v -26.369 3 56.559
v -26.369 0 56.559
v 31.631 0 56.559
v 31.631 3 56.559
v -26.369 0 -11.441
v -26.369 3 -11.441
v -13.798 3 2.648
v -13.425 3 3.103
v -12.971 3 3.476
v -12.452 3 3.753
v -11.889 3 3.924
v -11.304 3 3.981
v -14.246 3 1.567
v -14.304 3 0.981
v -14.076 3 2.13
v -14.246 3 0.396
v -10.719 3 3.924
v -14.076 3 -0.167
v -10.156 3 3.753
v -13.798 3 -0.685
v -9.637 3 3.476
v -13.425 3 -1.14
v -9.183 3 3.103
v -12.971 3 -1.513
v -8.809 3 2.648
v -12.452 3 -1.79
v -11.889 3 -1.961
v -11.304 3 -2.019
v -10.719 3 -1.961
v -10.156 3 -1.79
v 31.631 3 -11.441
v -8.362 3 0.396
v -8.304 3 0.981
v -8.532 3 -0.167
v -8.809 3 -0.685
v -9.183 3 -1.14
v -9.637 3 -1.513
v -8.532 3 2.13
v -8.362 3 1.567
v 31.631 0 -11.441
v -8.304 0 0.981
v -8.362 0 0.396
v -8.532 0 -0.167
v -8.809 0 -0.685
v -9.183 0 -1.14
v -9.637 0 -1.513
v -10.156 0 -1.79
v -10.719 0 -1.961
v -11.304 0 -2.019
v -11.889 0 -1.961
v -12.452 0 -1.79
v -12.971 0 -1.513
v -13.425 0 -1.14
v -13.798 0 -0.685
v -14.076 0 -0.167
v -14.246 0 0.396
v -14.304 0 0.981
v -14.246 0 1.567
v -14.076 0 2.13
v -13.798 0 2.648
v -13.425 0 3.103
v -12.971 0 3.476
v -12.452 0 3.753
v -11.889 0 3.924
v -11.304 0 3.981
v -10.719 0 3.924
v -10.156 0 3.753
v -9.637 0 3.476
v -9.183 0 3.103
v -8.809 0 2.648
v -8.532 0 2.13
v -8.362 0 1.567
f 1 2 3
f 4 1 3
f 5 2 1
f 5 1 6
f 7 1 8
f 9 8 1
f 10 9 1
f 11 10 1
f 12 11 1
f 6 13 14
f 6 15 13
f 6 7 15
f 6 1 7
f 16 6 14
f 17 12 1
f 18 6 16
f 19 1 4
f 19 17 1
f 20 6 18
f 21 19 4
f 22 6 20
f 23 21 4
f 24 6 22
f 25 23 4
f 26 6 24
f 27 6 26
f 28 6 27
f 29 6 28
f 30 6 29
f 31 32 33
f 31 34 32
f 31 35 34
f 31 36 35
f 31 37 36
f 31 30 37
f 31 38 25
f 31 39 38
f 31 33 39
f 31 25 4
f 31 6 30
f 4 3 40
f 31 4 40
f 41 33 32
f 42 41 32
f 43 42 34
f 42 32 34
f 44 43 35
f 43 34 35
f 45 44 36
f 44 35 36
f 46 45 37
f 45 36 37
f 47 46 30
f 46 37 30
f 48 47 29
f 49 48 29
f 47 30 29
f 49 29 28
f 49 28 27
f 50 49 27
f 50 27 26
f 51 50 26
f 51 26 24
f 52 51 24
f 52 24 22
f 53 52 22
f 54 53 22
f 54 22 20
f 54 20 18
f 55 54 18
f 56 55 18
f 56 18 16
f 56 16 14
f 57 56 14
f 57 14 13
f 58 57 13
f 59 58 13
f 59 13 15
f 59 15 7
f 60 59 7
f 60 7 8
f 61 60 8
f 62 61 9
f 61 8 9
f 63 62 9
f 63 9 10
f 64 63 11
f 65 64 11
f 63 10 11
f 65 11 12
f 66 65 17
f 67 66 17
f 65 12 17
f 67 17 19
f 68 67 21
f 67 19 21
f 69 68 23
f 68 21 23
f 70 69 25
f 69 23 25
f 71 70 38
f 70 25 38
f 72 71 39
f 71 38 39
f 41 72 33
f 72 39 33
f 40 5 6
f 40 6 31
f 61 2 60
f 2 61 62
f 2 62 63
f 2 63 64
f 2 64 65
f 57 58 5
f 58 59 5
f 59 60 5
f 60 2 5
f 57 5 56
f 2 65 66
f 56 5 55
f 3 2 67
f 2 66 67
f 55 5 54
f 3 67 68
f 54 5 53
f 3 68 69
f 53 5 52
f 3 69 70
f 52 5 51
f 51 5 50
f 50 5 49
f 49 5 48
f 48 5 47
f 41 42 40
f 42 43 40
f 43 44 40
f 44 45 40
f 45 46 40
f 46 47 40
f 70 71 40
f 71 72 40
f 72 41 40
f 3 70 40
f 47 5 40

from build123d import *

# Parameters (mm, degrees)
SKETCH1_W                 = 58
SKETCH1_H                 = 68
BOSS_EXTRUDE1_DEPTH       = 3
F_6_0MM_DOWEL_HOLE1_D     = 6
F_6_0MM_DOWEL_HOLE1_DEPTH = 3


with BuildPart() as part:
    # Sketch1 → Boss-Extrude1 (new body)
    with BuildSketch(Plane(origin=(0, 0, 0), x_dir=(1, 0, 0), z_dir=(0, 1, 0))):
        with Locations((2.631421053, -22.558871845)):
            Rectangle(SKETCH1_W, SKETCH1_H)
    extrude(amount=BOSS_EXTRUDE1_DEPTH)

    # Ø6.0mm Dowel Hole1
    with Locations(Plane(origin=(0, 0, 0), x_dir=(-1, 0, 0), z_dir=(0, -1, 0))):
        with Locations((11.303876488, -0.981472803)):
            Hole(F_6_0MM_DOWEL_HOLE1_D / 2, depth=F_6_0MM_DOWEL_HOLE1_DEPTH)


solid = part.part
